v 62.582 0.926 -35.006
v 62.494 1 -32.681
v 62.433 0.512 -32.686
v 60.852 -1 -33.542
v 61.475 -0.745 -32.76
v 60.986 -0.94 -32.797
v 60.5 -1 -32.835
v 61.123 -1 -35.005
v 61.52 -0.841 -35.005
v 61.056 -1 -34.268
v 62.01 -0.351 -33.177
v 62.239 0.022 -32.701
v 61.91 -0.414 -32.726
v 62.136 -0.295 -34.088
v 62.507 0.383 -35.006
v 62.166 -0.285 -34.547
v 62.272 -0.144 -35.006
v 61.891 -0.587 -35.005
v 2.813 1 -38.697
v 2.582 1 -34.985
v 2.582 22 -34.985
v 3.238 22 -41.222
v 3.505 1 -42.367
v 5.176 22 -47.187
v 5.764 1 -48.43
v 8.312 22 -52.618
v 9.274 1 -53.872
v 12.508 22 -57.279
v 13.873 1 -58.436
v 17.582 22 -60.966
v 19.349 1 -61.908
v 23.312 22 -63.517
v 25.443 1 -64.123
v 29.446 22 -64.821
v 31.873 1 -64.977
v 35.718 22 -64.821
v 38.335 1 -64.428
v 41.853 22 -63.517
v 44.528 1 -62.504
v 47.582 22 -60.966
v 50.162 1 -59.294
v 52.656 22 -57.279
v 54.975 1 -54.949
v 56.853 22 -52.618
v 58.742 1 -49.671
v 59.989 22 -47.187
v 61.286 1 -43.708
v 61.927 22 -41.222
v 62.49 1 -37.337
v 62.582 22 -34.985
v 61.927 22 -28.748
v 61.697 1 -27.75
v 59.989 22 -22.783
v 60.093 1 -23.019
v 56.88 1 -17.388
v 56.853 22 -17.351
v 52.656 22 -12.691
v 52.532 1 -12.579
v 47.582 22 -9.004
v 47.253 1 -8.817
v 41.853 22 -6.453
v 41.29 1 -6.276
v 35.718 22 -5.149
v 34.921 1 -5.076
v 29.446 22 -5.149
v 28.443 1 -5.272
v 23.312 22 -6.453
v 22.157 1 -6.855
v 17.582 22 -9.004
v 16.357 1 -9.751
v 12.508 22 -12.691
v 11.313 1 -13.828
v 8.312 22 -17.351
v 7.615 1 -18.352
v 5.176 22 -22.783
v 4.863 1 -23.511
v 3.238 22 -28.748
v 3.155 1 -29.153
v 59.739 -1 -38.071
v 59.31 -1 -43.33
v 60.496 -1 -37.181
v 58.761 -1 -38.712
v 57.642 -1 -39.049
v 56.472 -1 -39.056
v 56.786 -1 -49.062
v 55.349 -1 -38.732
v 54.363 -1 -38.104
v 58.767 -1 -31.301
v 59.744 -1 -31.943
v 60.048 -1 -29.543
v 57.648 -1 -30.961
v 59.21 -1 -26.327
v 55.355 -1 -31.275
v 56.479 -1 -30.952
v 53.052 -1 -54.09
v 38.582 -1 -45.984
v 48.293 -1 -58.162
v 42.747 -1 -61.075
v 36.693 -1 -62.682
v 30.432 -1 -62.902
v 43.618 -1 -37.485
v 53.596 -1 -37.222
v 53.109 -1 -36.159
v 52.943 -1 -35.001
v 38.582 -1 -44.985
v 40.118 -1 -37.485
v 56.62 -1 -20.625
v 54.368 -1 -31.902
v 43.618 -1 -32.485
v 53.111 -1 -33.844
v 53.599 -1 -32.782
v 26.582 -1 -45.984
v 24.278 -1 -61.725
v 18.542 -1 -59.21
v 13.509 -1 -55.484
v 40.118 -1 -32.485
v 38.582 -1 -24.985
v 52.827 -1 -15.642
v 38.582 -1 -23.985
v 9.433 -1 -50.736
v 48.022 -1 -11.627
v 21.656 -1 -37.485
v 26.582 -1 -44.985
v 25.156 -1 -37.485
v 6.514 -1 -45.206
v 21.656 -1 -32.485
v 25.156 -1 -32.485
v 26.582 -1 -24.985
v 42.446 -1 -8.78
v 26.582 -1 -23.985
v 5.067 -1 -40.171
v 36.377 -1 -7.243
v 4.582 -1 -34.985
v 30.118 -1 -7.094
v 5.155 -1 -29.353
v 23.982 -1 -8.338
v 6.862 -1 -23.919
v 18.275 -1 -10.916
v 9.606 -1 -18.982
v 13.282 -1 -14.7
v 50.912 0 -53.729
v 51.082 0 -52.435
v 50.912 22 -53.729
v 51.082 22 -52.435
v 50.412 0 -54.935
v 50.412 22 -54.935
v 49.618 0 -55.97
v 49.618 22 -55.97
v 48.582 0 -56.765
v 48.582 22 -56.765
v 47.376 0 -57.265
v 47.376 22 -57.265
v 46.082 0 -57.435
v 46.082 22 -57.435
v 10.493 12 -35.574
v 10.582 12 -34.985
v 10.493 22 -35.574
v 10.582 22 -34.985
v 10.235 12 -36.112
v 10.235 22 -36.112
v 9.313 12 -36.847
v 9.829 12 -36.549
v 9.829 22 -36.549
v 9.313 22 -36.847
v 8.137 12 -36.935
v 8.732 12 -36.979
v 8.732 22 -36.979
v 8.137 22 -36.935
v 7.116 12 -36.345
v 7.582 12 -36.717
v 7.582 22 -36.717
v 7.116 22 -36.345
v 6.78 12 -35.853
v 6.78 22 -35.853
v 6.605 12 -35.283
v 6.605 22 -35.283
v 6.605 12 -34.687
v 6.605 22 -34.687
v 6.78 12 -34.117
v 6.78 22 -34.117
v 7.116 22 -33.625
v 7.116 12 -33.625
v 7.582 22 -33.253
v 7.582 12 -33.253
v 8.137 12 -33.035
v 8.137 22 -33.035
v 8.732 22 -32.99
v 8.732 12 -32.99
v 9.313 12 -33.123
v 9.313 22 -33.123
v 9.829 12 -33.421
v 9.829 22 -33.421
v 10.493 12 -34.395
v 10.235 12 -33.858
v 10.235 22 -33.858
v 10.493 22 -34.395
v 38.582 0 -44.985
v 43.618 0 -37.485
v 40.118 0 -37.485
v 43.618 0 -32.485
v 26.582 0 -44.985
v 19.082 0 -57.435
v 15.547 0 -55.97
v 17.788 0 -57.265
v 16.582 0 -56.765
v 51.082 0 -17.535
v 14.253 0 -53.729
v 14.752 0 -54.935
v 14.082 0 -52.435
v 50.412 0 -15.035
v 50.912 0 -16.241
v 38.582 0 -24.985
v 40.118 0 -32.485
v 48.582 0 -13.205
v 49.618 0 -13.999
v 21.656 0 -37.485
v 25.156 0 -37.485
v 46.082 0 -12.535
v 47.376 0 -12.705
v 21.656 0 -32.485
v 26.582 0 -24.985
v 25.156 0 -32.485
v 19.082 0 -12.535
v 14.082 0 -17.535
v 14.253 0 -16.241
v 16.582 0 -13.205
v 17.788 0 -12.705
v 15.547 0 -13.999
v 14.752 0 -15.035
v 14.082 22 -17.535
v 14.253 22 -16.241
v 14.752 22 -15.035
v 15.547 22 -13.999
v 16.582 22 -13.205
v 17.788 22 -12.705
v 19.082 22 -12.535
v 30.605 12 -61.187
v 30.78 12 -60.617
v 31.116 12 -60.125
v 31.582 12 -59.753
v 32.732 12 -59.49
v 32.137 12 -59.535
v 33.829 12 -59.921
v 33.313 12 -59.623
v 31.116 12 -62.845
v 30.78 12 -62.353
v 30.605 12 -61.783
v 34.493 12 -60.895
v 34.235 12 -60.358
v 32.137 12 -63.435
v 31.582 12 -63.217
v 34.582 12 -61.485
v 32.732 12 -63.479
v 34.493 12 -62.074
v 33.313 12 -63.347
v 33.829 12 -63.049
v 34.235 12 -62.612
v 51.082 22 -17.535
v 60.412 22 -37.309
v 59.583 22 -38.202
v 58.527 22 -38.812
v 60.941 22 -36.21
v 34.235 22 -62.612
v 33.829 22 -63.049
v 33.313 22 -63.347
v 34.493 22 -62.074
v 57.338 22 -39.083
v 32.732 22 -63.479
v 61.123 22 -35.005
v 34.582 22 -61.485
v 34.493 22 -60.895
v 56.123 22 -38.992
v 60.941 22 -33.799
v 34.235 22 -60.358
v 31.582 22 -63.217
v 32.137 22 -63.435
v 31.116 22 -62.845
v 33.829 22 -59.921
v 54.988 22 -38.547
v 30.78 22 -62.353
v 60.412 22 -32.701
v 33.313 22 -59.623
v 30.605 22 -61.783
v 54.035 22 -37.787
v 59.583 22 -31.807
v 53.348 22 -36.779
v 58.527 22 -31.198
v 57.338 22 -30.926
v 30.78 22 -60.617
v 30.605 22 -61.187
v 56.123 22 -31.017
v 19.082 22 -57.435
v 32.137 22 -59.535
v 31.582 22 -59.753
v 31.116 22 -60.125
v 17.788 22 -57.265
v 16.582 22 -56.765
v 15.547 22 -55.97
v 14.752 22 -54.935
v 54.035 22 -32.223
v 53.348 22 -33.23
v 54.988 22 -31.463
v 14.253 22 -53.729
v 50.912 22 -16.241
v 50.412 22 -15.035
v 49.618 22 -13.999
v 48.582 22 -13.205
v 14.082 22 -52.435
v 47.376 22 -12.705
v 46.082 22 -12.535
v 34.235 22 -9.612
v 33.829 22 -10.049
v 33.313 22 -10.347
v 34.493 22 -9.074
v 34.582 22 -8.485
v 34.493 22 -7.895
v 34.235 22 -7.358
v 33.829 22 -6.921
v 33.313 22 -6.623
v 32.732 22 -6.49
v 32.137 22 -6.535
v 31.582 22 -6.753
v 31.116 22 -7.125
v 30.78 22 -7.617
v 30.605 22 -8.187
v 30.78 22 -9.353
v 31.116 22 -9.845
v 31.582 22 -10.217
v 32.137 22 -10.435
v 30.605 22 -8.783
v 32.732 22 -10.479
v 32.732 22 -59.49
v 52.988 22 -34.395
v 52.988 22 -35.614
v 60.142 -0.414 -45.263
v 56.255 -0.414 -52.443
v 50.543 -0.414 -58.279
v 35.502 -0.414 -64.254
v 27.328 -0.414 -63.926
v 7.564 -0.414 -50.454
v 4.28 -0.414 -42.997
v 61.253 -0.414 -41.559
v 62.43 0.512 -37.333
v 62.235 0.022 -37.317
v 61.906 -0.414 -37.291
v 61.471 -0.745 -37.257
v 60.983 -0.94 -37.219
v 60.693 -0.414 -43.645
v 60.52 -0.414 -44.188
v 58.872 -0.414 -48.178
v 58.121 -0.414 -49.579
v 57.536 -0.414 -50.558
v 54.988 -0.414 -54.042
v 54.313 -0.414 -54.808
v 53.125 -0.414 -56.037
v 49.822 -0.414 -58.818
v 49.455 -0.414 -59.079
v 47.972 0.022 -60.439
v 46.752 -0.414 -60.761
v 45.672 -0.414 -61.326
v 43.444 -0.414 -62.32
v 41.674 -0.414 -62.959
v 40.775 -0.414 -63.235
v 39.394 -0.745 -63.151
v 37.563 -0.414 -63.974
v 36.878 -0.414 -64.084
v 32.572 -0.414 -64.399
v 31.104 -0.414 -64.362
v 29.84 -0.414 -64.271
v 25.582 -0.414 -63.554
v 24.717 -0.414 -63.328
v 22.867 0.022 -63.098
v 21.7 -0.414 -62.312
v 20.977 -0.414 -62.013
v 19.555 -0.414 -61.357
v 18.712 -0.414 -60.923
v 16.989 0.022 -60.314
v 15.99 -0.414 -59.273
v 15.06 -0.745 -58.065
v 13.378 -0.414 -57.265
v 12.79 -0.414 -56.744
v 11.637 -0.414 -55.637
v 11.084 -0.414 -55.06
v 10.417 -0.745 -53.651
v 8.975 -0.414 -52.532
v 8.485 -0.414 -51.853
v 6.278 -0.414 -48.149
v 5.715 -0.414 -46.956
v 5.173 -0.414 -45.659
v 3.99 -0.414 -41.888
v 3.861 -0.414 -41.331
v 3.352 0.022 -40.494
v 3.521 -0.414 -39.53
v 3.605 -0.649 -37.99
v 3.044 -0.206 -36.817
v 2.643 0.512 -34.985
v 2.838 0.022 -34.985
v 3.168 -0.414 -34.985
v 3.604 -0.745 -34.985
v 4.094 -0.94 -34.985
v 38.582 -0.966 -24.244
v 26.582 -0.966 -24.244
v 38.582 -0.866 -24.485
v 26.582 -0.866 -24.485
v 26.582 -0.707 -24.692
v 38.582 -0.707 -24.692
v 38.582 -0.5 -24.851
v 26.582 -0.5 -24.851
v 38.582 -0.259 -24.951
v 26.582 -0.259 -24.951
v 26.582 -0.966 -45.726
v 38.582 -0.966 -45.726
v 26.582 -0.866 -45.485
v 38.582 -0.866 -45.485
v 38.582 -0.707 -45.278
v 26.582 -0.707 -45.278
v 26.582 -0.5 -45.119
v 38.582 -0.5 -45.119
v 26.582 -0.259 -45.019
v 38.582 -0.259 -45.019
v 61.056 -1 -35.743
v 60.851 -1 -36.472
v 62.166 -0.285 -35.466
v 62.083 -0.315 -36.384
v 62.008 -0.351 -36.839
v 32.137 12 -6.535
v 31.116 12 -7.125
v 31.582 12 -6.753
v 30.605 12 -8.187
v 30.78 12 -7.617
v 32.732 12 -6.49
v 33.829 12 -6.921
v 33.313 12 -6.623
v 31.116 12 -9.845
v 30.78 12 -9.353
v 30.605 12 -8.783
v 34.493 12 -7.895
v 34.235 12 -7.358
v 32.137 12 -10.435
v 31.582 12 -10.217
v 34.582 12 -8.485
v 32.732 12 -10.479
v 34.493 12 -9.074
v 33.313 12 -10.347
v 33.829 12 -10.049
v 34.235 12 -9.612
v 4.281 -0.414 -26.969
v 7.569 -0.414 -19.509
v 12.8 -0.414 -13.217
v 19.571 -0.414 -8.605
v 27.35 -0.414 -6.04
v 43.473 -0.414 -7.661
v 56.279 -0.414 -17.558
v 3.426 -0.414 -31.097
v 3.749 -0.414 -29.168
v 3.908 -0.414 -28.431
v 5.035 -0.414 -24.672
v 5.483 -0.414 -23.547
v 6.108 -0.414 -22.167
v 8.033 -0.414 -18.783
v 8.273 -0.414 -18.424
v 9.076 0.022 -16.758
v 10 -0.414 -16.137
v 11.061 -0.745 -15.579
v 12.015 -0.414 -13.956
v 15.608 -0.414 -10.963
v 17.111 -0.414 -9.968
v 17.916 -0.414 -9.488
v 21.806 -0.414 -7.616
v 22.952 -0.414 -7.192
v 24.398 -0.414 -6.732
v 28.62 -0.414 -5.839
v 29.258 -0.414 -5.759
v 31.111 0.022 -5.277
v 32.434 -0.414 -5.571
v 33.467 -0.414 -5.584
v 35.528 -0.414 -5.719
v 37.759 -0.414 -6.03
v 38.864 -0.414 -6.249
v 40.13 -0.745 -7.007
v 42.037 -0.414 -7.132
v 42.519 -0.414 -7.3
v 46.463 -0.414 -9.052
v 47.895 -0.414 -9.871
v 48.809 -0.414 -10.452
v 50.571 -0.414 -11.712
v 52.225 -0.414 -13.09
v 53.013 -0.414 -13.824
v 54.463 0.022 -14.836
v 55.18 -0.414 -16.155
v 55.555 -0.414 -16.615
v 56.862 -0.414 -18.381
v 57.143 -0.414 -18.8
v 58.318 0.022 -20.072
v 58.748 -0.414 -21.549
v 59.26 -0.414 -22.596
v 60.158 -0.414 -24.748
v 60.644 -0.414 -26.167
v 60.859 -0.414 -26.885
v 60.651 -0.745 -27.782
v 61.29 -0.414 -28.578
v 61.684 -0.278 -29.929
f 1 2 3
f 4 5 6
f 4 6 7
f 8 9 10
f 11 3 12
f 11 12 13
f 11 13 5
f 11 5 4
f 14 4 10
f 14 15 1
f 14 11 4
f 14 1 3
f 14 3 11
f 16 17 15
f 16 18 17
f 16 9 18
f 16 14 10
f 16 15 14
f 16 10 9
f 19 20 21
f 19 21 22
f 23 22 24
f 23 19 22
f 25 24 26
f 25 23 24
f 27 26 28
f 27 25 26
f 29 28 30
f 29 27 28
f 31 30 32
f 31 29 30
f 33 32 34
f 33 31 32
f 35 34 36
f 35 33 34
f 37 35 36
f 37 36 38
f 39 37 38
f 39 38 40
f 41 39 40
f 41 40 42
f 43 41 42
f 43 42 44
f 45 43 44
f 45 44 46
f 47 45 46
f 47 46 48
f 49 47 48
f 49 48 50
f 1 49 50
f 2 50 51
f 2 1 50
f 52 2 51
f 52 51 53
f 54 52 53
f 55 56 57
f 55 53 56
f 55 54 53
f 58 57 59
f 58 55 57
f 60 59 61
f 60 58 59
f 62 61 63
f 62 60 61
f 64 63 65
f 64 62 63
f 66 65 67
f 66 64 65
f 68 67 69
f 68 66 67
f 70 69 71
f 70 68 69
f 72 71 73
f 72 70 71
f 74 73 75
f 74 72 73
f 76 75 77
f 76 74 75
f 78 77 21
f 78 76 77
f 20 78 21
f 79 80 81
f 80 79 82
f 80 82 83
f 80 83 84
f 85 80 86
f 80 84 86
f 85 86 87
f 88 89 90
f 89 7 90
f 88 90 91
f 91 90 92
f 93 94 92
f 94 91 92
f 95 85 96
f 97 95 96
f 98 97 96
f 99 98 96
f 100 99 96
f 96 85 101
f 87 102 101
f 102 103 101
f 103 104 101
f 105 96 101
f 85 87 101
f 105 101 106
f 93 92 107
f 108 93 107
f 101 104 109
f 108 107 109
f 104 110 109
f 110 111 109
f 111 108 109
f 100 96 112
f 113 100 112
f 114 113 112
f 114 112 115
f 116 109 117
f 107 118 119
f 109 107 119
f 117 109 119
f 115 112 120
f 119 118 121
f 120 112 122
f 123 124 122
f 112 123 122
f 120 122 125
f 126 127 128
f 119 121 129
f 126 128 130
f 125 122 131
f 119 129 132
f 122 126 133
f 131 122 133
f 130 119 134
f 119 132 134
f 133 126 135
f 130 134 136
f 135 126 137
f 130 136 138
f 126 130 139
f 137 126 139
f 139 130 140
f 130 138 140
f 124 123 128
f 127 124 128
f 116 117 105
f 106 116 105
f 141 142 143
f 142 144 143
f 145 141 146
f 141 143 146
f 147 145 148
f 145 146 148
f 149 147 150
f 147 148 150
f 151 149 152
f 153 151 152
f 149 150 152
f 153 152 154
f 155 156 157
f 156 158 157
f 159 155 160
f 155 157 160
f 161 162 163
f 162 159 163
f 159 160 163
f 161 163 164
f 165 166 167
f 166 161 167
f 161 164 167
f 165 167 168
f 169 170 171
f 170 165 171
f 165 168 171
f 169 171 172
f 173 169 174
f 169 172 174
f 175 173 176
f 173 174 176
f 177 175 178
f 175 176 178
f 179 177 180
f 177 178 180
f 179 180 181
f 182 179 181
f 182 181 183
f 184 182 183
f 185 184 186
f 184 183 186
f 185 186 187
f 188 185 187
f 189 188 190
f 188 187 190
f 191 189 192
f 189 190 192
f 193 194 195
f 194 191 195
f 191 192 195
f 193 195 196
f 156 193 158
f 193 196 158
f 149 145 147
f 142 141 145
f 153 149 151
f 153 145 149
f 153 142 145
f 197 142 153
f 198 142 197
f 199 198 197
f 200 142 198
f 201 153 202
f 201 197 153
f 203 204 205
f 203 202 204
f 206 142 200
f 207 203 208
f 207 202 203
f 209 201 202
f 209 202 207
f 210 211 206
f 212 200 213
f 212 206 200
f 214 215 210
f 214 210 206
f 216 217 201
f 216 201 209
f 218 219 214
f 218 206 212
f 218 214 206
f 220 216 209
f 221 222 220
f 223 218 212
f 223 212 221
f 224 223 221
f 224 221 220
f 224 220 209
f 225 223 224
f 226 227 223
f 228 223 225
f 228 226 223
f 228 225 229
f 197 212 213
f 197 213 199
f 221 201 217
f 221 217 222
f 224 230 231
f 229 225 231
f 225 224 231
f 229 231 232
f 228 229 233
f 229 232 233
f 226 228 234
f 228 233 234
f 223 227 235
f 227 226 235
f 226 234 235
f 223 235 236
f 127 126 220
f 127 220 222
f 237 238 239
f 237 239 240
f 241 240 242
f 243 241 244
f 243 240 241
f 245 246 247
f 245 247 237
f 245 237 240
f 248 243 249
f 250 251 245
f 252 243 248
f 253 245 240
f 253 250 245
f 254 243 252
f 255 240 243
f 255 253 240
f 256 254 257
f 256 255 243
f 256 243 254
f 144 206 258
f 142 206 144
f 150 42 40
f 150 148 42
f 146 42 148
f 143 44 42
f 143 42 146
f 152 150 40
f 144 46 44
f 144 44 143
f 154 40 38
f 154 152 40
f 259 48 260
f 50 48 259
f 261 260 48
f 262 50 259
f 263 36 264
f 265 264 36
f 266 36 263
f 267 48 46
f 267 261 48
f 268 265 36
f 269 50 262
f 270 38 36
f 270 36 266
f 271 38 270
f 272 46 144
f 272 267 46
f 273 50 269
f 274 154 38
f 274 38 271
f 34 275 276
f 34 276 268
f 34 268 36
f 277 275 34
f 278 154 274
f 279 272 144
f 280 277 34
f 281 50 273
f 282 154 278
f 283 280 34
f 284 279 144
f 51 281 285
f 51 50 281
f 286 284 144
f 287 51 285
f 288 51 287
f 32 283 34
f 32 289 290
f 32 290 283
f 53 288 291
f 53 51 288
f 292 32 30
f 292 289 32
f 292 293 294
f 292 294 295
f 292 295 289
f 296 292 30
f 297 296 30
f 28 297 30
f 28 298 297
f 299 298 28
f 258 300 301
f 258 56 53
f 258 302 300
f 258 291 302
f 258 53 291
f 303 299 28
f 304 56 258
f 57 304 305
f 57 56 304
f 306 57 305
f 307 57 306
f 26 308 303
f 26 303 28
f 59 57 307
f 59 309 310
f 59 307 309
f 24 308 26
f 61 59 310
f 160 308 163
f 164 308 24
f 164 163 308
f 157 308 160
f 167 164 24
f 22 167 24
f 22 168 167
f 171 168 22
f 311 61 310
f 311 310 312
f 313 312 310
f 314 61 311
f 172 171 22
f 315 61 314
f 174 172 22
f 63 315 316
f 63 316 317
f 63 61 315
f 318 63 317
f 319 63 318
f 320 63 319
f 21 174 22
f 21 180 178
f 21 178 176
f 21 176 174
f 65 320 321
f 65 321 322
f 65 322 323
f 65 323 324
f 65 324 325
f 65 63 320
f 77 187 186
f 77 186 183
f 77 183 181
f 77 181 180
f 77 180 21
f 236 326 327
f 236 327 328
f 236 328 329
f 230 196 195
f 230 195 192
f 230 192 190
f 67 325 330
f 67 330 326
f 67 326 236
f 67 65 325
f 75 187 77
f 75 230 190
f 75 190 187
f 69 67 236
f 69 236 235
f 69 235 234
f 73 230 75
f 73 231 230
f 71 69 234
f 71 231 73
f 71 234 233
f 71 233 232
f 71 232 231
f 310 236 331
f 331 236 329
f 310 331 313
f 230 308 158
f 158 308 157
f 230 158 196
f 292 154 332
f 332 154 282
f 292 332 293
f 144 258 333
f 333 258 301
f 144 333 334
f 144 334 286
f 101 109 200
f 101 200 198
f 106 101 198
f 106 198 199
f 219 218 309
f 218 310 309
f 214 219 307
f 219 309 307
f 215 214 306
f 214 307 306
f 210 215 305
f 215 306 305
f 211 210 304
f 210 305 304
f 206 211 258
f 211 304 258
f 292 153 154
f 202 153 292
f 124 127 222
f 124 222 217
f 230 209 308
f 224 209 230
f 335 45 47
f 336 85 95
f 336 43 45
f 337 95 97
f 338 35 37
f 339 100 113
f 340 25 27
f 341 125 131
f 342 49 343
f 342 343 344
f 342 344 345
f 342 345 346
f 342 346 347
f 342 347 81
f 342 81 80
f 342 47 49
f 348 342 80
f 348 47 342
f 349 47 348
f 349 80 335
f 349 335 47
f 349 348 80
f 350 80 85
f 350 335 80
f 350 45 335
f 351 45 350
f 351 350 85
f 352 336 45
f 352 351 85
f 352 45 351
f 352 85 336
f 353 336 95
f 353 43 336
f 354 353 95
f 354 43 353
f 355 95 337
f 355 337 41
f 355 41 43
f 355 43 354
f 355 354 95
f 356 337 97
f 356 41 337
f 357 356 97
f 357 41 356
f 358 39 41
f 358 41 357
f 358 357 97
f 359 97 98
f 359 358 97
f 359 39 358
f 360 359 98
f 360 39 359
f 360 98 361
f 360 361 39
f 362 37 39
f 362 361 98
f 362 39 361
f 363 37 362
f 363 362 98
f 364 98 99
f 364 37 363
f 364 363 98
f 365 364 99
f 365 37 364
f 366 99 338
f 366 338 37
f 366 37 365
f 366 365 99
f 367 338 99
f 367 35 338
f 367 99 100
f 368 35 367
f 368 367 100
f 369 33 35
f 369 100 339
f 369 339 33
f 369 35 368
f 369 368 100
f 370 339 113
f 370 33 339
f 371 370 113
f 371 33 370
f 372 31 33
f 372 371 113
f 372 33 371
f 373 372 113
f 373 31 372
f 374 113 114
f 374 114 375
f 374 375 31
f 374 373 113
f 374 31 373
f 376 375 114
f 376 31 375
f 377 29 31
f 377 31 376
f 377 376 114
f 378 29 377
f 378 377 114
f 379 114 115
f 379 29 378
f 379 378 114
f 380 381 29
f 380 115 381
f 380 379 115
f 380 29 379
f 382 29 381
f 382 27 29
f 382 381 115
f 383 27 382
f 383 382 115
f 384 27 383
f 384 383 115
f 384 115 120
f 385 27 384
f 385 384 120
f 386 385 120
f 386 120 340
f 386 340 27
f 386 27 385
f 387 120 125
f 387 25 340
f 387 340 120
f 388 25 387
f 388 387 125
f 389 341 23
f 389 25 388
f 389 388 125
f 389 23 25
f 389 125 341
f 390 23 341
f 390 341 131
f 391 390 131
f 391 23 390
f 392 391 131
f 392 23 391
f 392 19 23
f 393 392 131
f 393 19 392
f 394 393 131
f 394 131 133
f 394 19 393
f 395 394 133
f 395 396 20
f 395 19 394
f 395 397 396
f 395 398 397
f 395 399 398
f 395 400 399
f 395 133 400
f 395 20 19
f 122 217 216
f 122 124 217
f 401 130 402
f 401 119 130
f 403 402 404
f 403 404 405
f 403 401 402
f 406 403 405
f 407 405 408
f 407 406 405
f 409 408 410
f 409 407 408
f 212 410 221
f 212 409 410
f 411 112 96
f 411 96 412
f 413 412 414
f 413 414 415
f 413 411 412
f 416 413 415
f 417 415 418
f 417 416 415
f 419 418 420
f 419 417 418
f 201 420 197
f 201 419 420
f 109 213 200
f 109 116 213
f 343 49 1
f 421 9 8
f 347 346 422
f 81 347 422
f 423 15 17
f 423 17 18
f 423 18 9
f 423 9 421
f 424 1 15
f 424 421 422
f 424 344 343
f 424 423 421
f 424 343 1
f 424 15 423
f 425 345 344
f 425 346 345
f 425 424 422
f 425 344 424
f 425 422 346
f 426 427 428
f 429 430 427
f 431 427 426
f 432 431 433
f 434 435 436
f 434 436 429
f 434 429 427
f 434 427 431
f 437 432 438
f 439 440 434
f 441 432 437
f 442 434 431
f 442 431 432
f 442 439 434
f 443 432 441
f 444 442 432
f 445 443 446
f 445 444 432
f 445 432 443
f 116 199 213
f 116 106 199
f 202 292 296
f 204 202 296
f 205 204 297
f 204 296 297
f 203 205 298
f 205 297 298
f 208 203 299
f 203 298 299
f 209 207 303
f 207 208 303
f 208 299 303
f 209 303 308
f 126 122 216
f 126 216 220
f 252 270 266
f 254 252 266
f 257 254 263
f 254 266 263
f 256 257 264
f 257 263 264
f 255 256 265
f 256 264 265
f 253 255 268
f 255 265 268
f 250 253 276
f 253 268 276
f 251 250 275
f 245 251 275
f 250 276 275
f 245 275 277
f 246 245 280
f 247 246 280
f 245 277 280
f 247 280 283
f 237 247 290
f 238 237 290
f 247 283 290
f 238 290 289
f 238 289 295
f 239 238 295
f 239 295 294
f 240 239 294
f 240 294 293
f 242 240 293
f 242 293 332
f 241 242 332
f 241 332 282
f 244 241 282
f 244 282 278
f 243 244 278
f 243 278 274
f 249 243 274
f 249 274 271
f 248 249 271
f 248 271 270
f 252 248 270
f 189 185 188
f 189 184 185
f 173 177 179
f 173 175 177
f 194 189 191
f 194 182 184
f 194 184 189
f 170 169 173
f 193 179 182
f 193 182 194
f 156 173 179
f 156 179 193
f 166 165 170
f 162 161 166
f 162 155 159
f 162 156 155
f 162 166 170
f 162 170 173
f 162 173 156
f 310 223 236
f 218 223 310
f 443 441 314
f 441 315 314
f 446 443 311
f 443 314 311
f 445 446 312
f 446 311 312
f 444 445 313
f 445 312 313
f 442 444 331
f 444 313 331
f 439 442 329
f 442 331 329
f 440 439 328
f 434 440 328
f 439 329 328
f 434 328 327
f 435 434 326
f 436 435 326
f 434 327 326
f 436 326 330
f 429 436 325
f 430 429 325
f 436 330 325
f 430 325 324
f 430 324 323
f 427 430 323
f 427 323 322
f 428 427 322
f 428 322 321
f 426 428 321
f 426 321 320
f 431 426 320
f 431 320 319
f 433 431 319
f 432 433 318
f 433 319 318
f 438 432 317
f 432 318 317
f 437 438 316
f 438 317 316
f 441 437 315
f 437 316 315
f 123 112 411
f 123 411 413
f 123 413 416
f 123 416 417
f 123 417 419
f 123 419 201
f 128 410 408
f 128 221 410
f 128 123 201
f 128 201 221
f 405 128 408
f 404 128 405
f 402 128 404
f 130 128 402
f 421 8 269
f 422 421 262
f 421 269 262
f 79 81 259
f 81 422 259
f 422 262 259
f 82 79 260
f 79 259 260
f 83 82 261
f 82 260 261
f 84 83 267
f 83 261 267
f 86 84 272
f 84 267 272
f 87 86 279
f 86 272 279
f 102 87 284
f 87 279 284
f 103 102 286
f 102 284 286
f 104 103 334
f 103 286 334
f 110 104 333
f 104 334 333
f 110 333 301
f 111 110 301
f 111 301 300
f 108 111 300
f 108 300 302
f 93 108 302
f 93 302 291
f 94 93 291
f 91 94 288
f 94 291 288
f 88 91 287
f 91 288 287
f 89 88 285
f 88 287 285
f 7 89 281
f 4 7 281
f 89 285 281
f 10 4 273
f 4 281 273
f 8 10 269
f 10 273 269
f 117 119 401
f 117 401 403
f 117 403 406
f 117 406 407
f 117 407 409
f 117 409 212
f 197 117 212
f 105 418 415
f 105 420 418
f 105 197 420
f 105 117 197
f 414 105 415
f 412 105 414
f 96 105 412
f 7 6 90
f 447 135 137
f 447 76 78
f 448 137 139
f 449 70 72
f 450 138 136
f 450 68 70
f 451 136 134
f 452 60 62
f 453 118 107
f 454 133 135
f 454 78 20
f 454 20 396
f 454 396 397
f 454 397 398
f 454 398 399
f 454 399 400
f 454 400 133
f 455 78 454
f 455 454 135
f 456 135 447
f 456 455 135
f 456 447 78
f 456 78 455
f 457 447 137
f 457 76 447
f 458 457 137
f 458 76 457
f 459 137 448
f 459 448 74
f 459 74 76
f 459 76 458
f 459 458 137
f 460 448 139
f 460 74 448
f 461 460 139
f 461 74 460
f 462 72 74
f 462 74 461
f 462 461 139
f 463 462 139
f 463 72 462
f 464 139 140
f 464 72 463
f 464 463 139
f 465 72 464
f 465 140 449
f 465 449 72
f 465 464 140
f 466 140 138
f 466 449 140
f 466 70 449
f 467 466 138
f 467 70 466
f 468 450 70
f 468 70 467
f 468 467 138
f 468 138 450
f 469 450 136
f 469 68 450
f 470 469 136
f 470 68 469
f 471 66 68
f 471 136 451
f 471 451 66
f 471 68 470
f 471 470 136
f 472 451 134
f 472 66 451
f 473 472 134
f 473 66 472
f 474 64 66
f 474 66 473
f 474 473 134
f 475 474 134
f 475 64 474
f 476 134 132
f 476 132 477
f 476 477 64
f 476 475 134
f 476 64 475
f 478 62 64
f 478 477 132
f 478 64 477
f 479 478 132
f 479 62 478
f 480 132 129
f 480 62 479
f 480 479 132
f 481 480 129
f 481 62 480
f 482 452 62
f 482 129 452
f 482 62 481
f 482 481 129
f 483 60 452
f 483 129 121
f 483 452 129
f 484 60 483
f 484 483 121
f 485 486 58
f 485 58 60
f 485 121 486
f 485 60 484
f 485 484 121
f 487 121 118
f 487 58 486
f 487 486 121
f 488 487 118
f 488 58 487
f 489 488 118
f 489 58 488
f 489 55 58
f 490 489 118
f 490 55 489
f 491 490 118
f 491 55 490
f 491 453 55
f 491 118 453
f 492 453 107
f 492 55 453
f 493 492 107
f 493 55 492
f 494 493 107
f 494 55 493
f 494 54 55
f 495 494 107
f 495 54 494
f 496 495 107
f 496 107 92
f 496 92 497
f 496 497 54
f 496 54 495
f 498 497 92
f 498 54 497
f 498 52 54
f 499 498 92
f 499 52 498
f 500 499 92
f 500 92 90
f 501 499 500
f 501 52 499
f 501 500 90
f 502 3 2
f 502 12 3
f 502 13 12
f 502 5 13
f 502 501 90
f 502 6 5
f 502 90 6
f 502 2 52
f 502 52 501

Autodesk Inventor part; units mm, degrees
ref_plane "YZ Plane" through (0, 0, 0) normal (1, 0, 0) x (0, 1, 0)
ref_plane "XZ Plane" through (0, 0, 0) normal (0, 1, 0) x (-1, 0, 0)
ref_plane "XY Plane" through (0, 0, 0) normal (0, 0, 1) x (1, 0, 0)
sketch "Sketch1" plane through (0, 0, 0) normal (0, 1, 0) x (-1, 0, 0)
  point P0 (0, 0)
sketch "Sketch2" plane through (0, 0, 0) normal (0, 1, 0) x (-1, 0, 0)
  line L0 (-14.0823, -12.5349) -> (-51.0823, -12.5349)
  line L1 (-51.0823, -12.5349) -> (-51.0823, -57.4349)
  line L2 (-51.0823, -57.4349) -> (-14.0823, -57.4349)
  line L3 (-14.0823, -57.4349) -> (-14.0823, -12.5349)
  circle A0 centre (-32.5823, -34.9849) radius 30
  point P0 (0, 0)
  dimension "d0" = 37
  dimension "d1" = 44.9
extrude "Extrusion1" add sketch "Sketch2" against normal blind 1 contours L3 L2 L1 L0 | A0
extrude "Extrusion2" add sketch "Sketch2" along normal blind 22
sketch "Sketch3" plane through (32.5823, 22, -34.9849) normal (0, 1, 0) x (1, 0, 0)
  circle A0 centre (24.4505, 0.0199) radius 4.09
  point P0 (-32.5823, -34.9849)
  dimension "d9" = 8.18
extrude "Extrusion3" cut sketch "Sketch3" against normal up to next
sketch "Sketch4" plane through (32.5823, 22, -34.9849) normal (0, 1, 0) x (1, 0, 0)
  point P0 (-32.5823, -34.9849)
sketch "Sketch6" plane through (32.5823, 22, -34.9849) normal (0, 1, 0) x (1, 0, 0)
  circle A0 centre (0, 0) radius 30 projected
  line L0 (-30, 0) -> (-24, 0)
  circle A1 centre (-24, 0) radius 2
  point P0 (-32.5823, -34.9849)
  dimension "d23" = 6
  dimension "d24" = 4
sketch "Sketch7" plane through (32.5823, 22, -34.9849) normal (0, 1, 0) x (1, 0, 0)
  circle A0 centre (0, 0) radius 30 projected
  line L0 (0, -30) -> (0, -26.5)
  circle A1 centre (0, -26.5) radius 2
  line L1 (0, 30) -> (0, 26.5)
  circle A2 centre (0, 26.5) radius 2
  point P0 (-32.5823, -34.9849)
  dimension "d25" = 3.5
  dimension "d26" = 4
  dimension "d27" = 3.5
  dimension "d28" = 4
extrude "Extrusion5" cut sketch "Sketch7" against normal blind 10 contours A2 | A1
extrude "Extrusion6" cut sketch "Sketch6" against normal blind 10 contours A1
thread "Thread4" size "M4x0.7" class "6H" standard "ANSI Metric M Profile" length 10
thread "Thread5" size "M4x0.7" class "6H" standard "ANSI Metric M Profile" full length
thread "Thread6" size "M4x0.7" class "6H" standard "ANSI Metric M Profile" full length
sketch "Sketch8" plane through (32.5823, 22, -34.9849) normal (0, 1, 0) x (1, 0, 0)
  point P0 (-32.5823, -34.9849)
fillet "Fillet1" radius 2 1 edges at (62.5823, -1, -34.9849)
fillet "Fillet2" radius 5 4 edges at (14.0823, 11, -57.4349) (14.0823, 11, -12.5349) (51.0823, 11, -12.5349) (51.0823, 11, -57.4349)
sketch "Sketch10" plane through (0, -1, 0) normal (0, -1, 0) x (1, 0, 0)
  line L0 (38.5823, -44.9849) -> (26.5823, -44.9849)
  line L1 (26.5823, -44.9849) -> (26.5823, -24.9849)
  line L2 (26.5823, -24.9849) -> (38.5823, -24.9849)
  line L3 (38.5823, -24.9849) -> (38.5823, -44.9849)
  arc A0 (60.4997, -32.8347) -> (60.4961, -37.1806) centre (32.5823, -34.9849) ccw projected
  line L4 (38.5823, -44.9849) -> (26.5823, -24.9849) construction
  line L5 (26.5823, -44.9849) -> (38.5823, -24.9849) construction
  line L6 (43.6176, -37.4849) -> (40.1176, -37.4849)
  line L7 (40.1176, -37.4849) -> (40.1176, -32.4849)
  line L8 (40.1176, -32.4849) -> (43.6176, -32.4849)
  line L9 (43.6176, -32.4849) -> (43.6176, -37.4849)
  line L10 (43.6176, -37.4849) -> (40.1176, -32.4849) construction
  line L11 (40.1176, -37.4849) -> (43.6176, -32.4849) construction
  line L12 (25.1564, -37.4849) -> (21.6564, -37.4849)
  line L13 (21.6564, -37.4849) -> (21.6564, -32.4849)
  line L14 (21.6564, -32.4849) -> (25.1564, -32.4849)
  line L15 (25.1564, -32.4849) -> (25.1564, -37.4849)
  line L16 (25.1564, -37.4849) -> (21.6564, -32.4849) construction
  line L17 (21.6564, -37.4849) -> (25.1564, -32.4849) construction
  point P0 (0, 0)
  point P1 (41.8676, -34.9849)
  point P2 (23.4064, -34.9849)
  dimension "d49" = 12
  dimension "d50" = 20
  dimension "d51" = 3.5
  dimension "d52" = 5
  dimension "d53" = 3.5
  dimension "d54" = 5
extrude "Extrusion8" cut sketch "Sketch10" against normal blind 2
fillet "Fillet3" radius 1 2 edges at (32.5823, -1, -44.9849) (32.5823, -1, -24.9849)
properties part number "webcam_holder_center"
